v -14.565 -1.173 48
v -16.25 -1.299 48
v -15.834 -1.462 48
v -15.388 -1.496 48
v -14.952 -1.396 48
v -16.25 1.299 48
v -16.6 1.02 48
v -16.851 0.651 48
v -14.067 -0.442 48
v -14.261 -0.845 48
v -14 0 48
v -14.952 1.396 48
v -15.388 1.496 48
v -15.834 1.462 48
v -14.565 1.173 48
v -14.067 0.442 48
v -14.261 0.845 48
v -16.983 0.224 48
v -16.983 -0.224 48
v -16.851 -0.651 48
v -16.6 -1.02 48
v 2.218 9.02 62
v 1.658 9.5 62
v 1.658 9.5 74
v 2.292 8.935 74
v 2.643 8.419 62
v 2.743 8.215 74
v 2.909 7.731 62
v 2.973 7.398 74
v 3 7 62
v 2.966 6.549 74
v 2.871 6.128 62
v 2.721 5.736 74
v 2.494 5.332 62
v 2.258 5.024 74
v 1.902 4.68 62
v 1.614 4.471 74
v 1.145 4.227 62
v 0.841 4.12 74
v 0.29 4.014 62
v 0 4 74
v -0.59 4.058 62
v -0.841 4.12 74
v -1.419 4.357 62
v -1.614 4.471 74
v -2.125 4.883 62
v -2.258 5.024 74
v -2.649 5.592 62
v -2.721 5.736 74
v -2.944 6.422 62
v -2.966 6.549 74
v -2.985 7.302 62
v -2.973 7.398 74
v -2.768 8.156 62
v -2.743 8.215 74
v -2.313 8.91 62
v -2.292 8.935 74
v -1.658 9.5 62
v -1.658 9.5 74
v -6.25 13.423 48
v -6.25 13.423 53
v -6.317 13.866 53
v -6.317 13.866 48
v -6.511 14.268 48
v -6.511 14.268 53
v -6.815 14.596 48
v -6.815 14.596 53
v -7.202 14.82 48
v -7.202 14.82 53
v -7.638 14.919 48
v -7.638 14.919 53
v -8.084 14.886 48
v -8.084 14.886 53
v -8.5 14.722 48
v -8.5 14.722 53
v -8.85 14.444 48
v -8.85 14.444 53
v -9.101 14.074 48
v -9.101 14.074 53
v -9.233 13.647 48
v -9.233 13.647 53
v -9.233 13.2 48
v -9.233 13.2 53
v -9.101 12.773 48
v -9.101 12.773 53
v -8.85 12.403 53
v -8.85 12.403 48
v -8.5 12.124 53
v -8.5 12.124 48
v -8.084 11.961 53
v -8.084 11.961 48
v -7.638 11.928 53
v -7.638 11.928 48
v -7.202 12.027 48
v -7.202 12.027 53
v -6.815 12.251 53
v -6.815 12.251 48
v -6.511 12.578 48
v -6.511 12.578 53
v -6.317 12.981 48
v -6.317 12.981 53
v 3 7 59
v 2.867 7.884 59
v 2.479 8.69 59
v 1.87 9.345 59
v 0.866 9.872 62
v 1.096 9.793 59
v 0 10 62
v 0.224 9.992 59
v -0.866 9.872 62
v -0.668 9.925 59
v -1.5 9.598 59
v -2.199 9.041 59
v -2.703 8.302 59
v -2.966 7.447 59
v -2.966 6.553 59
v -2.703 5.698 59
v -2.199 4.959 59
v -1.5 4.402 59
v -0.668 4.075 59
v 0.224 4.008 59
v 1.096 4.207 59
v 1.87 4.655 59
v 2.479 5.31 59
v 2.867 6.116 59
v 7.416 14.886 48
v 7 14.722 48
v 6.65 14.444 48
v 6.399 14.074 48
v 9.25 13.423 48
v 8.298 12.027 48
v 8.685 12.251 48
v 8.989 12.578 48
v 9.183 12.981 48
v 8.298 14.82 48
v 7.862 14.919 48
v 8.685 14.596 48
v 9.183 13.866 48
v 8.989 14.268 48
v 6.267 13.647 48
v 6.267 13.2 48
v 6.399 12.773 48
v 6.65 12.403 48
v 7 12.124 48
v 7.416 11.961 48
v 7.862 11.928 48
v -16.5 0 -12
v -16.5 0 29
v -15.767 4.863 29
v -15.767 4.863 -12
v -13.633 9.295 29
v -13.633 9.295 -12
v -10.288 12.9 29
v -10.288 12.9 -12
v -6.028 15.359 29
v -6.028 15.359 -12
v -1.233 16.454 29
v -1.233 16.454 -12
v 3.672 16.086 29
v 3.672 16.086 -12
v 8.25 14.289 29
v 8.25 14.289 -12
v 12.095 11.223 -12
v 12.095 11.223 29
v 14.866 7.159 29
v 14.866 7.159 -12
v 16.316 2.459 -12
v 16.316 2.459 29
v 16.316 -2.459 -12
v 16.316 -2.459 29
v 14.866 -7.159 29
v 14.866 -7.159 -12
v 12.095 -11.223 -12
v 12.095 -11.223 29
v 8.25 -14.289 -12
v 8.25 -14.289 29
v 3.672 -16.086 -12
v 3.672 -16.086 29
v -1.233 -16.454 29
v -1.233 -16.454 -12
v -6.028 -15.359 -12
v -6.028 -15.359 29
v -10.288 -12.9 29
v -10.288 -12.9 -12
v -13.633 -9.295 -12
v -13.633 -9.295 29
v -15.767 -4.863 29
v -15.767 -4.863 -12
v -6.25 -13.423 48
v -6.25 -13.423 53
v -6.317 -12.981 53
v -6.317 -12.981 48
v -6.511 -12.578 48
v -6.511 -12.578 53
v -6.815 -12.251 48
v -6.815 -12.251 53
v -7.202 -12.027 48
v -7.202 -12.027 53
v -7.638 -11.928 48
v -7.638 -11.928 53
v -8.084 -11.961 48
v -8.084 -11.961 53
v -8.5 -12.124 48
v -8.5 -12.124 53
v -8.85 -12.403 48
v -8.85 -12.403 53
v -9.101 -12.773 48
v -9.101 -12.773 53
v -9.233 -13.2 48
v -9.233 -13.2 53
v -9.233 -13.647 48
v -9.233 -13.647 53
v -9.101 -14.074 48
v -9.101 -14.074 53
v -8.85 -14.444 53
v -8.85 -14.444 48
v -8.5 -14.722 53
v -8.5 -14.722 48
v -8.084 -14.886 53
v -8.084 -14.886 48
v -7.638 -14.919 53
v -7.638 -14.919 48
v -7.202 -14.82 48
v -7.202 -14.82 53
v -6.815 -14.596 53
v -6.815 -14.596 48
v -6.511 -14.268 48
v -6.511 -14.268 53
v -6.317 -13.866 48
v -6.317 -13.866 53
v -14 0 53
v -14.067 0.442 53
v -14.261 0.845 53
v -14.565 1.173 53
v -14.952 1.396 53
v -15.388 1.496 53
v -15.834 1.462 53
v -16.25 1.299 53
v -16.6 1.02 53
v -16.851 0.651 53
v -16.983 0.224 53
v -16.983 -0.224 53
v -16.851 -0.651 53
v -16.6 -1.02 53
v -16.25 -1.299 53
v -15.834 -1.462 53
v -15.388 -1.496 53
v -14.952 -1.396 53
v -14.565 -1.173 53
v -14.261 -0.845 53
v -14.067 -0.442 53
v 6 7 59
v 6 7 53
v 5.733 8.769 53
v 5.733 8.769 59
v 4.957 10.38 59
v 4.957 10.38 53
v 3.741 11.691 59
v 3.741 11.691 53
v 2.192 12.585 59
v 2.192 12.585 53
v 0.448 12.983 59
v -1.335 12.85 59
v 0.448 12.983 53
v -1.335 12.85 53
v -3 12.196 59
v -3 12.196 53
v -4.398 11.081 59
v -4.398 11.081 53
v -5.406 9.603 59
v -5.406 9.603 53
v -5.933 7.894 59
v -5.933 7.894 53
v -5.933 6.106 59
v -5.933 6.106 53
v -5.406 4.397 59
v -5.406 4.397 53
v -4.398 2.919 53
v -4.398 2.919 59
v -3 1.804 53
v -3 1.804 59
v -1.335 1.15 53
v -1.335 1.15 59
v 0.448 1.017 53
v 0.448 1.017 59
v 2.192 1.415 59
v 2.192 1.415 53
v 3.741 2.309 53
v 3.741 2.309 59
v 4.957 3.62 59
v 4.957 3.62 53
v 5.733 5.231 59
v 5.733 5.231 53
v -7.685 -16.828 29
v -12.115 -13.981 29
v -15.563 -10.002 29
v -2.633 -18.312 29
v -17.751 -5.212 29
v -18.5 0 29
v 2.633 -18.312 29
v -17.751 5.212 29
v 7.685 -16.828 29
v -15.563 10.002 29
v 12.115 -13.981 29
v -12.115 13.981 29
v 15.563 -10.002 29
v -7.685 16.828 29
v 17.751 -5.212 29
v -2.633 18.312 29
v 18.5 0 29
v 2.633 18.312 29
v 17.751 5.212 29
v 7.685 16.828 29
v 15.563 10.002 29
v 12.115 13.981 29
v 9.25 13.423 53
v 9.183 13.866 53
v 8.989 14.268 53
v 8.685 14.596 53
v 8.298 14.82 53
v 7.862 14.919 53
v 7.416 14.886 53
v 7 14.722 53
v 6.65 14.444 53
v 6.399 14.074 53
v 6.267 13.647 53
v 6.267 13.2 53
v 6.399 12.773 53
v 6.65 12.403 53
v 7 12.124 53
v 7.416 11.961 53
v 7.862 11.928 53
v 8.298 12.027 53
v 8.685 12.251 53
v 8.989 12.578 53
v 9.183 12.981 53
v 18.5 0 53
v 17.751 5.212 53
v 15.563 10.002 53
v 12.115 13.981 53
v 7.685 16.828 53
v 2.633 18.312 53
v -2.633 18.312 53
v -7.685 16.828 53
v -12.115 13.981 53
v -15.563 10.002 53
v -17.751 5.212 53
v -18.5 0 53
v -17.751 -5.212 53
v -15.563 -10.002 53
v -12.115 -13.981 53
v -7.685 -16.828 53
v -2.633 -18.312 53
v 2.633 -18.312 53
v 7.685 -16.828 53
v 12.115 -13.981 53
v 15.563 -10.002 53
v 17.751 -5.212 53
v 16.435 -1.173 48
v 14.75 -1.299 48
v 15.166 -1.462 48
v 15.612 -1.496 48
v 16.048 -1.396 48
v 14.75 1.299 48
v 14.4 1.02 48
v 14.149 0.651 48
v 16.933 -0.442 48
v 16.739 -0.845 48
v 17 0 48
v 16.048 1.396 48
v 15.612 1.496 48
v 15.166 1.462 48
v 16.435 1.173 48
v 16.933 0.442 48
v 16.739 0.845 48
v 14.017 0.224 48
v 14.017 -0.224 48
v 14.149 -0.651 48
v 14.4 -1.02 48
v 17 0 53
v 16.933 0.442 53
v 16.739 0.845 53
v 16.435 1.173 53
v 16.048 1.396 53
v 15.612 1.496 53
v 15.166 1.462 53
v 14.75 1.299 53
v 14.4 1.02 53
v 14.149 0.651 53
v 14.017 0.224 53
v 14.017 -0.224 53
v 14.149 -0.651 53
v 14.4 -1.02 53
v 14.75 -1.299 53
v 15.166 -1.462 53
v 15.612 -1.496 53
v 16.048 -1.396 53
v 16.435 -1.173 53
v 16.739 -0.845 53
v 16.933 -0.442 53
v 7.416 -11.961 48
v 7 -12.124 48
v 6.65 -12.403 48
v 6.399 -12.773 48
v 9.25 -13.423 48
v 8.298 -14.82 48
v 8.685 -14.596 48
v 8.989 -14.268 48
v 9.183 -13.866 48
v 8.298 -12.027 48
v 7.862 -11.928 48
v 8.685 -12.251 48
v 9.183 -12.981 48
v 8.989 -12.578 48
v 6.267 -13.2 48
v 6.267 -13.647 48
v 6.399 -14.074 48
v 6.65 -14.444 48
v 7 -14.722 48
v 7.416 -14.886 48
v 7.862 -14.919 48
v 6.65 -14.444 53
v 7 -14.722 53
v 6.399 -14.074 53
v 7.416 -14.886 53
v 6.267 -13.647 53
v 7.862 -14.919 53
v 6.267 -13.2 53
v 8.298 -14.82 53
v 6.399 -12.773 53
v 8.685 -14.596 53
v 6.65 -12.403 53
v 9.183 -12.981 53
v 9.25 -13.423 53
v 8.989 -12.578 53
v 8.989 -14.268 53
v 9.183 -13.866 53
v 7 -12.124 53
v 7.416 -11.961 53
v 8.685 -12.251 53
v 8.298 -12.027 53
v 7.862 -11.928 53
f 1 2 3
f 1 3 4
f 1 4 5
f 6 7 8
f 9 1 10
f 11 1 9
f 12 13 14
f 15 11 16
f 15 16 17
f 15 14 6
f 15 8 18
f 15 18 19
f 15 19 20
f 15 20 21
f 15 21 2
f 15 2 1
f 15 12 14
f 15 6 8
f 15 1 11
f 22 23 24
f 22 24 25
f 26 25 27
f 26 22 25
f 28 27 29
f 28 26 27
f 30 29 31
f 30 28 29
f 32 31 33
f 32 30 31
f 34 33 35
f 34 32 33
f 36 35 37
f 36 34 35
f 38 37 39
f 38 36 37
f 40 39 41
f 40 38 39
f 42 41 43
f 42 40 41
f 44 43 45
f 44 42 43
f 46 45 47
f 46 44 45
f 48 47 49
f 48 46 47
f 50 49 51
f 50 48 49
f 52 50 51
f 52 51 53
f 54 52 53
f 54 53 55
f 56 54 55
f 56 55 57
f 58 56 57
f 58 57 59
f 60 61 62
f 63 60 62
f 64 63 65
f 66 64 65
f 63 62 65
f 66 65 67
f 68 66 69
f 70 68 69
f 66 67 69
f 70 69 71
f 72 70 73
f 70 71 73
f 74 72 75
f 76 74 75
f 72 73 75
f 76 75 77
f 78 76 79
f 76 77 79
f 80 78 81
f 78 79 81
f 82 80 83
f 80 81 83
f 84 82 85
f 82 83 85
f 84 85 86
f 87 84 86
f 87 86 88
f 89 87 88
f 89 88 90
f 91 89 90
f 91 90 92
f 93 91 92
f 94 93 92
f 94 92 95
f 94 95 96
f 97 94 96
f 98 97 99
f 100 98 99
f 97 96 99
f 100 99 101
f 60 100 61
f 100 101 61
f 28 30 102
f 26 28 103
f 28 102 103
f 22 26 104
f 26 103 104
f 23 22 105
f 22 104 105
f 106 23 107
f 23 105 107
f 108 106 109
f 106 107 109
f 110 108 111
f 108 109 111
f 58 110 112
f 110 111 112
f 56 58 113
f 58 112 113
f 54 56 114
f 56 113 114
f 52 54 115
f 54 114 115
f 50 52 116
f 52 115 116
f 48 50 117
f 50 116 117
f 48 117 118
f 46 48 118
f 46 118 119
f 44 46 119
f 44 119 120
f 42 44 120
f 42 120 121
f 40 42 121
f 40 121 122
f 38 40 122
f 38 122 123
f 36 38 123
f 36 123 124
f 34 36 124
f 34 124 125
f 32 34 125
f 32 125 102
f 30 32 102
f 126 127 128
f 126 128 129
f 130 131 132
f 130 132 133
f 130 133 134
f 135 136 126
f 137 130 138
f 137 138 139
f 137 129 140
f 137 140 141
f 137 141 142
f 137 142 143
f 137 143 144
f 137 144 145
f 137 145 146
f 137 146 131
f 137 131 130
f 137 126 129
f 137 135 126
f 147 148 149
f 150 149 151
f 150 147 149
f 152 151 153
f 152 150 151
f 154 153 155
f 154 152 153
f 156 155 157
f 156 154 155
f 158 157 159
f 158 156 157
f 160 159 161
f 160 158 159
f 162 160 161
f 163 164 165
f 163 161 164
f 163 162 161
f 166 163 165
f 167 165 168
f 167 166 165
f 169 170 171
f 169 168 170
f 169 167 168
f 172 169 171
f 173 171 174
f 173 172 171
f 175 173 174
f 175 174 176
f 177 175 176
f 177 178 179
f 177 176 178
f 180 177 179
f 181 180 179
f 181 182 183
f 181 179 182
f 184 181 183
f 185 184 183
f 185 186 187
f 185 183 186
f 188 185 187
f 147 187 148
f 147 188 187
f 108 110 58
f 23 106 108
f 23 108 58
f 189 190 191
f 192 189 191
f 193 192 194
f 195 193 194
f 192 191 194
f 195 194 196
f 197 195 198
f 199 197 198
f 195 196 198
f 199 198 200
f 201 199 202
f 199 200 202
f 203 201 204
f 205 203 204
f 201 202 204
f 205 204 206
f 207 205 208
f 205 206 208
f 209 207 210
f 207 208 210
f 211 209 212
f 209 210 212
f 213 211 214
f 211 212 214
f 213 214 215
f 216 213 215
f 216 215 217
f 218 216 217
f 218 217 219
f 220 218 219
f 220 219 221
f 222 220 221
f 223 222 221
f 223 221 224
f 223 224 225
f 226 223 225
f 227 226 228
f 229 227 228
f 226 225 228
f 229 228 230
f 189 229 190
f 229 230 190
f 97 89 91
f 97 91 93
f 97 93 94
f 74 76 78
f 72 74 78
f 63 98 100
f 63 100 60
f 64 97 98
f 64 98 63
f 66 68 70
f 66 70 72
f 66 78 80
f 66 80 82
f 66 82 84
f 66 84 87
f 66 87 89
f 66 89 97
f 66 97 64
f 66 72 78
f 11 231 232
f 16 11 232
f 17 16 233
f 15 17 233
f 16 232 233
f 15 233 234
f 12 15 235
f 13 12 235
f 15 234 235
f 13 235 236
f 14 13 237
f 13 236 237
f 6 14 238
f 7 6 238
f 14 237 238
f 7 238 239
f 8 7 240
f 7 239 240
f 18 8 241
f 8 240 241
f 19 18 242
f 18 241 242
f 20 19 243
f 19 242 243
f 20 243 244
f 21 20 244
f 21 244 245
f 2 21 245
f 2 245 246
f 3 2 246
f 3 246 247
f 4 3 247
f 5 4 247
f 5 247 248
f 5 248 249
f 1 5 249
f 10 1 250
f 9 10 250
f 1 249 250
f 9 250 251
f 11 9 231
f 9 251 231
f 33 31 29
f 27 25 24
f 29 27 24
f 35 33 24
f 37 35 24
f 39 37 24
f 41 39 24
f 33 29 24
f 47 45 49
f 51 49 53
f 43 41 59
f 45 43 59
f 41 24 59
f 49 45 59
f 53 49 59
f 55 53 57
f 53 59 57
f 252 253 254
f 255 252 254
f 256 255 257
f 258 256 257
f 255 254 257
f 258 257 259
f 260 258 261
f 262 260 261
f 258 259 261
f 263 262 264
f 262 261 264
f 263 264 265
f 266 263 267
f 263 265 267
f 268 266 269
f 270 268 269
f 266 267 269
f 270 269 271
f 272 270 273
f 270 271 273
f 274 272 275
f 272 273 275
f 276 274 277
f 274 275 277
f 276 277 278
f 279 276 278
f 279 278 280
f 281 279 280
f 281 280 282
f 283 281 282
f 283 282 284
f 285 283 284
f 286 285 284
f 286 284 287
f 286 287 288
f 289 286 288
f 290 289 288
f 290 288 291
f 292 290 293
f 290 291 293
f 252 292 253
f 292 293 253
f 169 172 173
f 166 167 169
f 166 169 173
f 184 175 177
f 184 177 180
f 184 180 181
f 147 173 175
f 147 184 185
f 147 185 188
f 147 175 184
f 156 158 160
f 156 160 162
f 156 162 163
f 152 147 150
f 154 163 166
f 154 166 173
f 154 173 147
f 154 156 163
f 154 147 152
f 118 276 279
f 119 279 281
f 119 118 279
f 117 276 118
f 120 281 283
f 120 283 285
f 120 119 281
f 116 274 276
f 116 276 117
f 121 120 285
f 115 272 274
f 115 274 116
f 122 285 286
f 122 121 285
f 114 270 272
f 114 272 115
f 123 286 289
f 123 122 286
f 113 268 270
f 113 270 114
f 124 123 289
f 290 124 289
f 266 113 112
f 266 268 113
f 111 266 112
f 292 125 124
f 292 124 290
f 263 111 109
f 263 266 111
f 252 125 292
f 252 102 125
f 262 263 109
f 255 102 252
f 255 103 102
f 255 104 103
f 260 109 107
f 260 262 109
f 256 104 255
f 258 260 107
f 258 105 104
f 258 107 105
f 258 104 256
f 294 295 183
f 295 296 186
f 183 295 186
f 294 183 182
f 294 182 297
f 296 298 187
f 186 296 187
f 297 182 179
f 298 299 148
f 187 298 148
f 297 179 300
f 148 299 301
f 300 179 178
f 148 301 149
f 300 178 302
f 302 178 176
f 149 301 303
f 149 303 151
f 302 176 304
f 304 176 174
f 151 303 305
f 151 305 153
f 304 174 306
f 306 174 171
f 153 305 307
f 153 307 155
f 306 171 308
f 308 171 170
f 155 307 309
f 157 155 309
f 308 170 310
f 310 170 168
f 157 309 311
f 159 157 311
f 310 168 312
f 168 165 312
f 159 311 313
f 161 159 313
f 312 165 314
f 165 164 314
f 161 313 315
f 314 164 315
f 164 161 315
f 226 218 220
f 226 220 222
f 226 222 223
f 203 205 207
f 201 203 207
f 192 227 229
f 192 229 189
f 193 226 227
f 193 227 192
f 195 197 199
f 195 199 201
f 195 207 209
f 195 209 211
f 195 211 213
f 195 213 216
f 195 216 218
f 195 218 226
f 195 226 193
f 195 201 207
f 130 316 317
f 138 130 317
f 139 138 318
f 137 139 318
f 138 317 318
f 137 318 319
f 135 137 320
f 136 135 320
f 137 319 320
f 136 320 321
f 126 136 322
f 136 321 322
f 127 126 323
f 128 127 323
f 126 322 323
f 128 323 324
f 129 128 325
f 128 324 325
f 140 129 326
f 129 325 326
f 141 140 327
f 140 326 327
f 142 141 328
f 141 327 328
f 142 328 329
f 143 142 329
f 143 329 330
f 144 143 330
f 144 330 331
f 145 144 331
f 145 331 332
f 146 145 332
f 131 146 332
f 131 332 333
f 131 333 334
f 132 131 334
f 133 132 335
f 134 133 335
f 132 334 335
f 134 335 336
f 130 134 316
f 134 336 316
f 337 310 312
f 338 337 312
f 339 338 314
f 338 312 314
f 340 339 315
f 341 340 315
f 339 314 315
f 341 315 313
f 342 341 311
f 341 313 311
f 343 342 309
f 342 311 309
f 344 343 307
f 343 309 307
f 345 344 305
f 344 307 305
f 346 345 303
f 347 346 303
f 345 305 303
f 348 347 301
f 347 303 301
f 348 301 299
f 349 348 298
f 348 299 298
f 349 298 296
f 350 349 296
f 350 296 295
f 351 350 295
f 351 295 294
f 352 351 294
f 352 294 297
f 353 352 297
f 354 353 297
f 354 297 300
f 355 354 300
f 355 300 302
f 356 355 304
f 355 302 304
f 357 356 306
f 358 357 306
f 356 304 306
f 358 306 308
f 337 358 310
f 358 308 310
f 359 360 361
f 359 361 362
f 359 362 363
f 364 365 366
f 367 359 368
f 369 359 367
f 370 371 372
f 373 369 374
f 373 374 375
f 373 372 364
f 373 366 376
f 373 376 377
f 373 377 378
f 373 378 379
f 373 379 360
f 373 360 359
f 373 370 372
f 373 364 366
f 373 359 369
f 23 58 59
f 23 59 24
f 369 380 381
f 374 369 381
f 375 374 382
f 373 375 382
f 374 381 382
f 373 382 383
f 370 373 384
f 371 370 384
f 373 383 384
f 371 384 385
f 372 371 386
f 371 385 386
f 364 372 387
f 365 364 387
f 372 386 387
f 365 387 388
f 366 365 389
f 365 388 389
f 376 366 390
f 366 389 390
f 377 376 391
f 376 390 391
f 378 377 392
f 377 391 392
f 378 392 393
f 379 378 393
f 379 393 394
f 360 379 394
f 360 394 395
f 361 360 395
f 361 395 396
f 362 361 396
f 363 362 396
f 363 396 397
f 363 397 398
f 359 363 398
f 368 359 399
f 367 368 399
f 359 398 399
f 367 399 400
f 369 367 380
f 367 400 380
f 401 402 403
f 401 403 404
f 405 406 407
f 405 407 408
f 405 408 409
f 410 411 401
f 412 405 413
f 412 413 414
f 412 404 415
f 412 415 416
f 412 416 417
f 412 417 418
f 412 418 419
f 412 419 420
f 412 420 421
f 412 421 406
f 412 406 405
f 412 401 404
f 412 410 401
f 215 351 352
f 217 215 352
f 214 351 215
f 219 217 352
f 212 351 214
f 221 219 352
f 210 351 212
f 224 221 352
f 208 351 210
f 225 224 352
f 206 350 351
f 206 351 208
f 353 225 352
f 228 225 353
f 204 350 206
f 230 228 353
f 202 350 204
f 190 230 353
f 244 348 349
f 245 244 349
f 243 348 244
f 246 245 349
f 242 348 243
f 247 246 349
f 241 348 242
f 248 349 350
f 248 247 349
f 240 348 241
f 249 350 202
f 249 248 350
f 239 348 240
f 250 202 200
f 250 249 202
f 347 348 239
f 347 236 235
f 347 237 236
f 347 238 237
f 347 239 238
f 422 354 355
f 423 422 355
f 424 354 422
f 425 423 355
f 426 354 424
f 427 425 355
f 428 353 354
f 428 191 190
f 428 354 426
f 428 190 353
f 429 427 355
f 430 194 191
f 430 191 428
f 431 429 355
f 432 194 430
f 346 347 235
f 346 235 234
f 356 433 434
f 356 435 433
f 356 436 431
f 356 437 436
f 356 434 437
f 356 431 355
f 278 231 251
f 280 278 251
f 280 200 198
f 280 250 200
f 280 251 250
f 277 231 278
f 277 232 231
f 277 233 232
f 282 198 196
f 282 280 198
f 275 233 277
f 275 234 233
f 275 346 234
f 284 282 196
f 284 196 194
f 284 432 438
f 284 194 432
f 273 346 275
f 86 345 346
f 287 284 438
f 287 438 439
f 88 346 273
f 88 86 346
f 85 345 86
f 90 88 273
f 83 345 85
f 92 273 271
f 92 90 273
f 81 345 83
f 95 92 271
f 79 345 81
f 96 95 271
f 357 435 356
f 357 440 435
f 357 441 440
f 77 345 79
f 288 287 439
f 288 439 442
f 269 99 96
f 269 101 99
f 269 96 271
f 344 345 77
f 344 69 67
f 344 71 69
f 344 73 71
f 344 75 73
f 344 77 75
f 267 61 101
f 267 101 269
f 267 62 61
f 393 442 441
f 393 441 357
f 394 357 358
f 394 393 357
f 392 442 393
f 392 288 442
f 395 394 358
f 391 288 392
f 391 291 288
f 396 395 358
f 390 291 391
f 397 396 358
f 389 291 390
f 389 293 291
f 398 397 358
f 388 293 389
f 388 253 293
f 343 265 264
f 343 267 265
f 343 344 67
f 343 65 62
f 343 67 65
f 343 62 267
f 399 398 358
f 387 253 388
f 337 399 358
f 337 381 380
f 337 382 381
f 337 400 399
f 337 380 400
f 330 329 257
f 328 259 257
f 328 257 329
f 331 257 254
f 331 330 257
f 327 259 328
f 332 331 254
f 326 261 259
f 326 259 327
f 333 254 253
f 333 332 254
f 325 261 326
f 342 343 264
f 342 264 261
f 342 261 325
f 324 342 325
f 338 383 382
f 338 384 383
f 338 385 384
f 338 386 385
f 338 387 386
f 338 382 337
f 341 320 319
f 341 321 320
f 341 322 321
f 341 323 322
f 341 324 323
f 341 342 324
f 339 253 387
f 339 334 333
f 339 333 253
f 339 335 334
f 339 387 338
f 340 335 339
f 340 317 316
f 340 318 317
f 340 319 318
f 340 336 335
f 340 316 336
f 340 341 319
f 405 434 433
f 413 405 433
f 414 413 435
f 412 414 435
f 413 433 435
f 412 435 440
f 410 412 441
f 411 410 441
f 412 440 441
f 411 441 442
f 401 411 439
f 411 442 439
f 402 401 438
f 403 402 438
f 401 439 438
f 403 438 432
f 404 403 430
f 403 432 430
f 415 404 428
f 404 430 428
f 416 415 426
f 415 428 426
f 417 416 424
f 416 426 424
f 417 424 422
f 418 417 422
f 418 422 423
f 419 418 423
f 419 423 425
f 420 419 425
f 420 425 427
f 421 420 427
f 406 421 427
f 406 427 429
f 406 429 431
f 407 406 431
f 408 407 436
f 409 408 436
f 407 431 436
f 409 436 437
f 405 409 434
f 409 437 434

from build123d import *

# Parameters (mm, degrees)
SKETCH1_R           = 16.5
BOSS_EXTRUDE1_DEPTH = 29
SKETCH2_R           = 18.5
BOSS_EXTRUDE2_DEPTH = 24
SKETCH3_R           = 6
BOSS_EXTRUDE3_DEPTH = 6
SKETCH4_R           = 3
BOSS_EXTRUDE5_DEPTH = 3
BOSS_EXTRUDE6_DEPTH = 12
BOSS_EXTRUDE8_START = 12
SKETCH6_R           = 16.5
BOSS_EXTRUDE8_DEPTH = 12
SKETCH7_R           = 1.5
CUT_EXTRUDE1_DEPTH  = 5


with BuildPart() as part:
    # Sketch1 → Boss-Extrude1 (new body)
    with BuildSketch(Plane.XY):
        with Locations(Location((0, 0, 0), (0, 0, 180))):
            Circle(SKETCH1_R)
    extrude(amount=BOSS_EXTRUDE1_DEPTH)

    # Sketch2 → Boss-Extrude2 (add)
    with BuildSketch(Plane.XY.offset(29)):
        Circle(SKETCH2_R)
    extrude(amount=BOSS_EXTRUDE2_DEPTH)

    # Sketch3 → Boss-Extrude3 (add)
    with BuildSketch(Plane.XY.offset(53)):
        with Locations((0, 7)):
            Circle(SKETCH3_R)
    extrude(amount=BOSS_EXTRUDE3_DEPTH)

    # Sketch4 → Boss-Extrude5 (add)
    with BuildSketch(Plane.XY.offset(59)):
        with Locations((0, 7)):
            Circle(SKETCH4_R)
    extrude(amount=BOSS_EXTRUDE5_DEPTH)

    # Sketch5 → Boss-Extrude6 (add)
    with BuildSketch(Plane.XY.offset(62)):
        with BuildLine():
            Line((-1.658312395, 9.5), (1.658312395, 9.5))
            ThreePointArc((1.658312395, 9.5), (0, 4), (-1.658312395, 9.5))
        make_face()
    extrude(amount=BOSS_EXTRUDE6_DEPTH)

    # Sketch6 → Boss-Extrude8 (add)
    with BuildSketch(Plane(origin=(0, 0, 0), x_dir=(-1, 0, 0), z_dir=(0, 0, -1)).offset(BOSS_EXTRUDE8_START)):
        Circle(SKETCH6_R)
    extrude(amount=-BOSS_EXTRUDE8_DEPTH)

    # Sketch7 → Cut-Extrude1 (cut)
    with BuildSketch(Plane.XY.offset(53)):
        with Locations((-15.5, 0)):
            Circle(SKETCH7_R)
        with Locations((7.75, 13.423393759)):
            Circle(SKETCH7_R)
        with Locations((7.75, -13.423393759)):
            Circle(SKETCH7_R)
        with Locations((15.5, 0)):
            Circle(SKETCH7_R)
        with Locations((-7.75, -13.423393759)):
            Circle(SKETCH7_R)
        with Locations((-7.75, 13.423393759)):
            Circle(SKETCH7_R)
    extrude(amount=-CUT_EXTRUDE1_DEPTH, mode=Mode.SUBTRACT)


solid = part.part
